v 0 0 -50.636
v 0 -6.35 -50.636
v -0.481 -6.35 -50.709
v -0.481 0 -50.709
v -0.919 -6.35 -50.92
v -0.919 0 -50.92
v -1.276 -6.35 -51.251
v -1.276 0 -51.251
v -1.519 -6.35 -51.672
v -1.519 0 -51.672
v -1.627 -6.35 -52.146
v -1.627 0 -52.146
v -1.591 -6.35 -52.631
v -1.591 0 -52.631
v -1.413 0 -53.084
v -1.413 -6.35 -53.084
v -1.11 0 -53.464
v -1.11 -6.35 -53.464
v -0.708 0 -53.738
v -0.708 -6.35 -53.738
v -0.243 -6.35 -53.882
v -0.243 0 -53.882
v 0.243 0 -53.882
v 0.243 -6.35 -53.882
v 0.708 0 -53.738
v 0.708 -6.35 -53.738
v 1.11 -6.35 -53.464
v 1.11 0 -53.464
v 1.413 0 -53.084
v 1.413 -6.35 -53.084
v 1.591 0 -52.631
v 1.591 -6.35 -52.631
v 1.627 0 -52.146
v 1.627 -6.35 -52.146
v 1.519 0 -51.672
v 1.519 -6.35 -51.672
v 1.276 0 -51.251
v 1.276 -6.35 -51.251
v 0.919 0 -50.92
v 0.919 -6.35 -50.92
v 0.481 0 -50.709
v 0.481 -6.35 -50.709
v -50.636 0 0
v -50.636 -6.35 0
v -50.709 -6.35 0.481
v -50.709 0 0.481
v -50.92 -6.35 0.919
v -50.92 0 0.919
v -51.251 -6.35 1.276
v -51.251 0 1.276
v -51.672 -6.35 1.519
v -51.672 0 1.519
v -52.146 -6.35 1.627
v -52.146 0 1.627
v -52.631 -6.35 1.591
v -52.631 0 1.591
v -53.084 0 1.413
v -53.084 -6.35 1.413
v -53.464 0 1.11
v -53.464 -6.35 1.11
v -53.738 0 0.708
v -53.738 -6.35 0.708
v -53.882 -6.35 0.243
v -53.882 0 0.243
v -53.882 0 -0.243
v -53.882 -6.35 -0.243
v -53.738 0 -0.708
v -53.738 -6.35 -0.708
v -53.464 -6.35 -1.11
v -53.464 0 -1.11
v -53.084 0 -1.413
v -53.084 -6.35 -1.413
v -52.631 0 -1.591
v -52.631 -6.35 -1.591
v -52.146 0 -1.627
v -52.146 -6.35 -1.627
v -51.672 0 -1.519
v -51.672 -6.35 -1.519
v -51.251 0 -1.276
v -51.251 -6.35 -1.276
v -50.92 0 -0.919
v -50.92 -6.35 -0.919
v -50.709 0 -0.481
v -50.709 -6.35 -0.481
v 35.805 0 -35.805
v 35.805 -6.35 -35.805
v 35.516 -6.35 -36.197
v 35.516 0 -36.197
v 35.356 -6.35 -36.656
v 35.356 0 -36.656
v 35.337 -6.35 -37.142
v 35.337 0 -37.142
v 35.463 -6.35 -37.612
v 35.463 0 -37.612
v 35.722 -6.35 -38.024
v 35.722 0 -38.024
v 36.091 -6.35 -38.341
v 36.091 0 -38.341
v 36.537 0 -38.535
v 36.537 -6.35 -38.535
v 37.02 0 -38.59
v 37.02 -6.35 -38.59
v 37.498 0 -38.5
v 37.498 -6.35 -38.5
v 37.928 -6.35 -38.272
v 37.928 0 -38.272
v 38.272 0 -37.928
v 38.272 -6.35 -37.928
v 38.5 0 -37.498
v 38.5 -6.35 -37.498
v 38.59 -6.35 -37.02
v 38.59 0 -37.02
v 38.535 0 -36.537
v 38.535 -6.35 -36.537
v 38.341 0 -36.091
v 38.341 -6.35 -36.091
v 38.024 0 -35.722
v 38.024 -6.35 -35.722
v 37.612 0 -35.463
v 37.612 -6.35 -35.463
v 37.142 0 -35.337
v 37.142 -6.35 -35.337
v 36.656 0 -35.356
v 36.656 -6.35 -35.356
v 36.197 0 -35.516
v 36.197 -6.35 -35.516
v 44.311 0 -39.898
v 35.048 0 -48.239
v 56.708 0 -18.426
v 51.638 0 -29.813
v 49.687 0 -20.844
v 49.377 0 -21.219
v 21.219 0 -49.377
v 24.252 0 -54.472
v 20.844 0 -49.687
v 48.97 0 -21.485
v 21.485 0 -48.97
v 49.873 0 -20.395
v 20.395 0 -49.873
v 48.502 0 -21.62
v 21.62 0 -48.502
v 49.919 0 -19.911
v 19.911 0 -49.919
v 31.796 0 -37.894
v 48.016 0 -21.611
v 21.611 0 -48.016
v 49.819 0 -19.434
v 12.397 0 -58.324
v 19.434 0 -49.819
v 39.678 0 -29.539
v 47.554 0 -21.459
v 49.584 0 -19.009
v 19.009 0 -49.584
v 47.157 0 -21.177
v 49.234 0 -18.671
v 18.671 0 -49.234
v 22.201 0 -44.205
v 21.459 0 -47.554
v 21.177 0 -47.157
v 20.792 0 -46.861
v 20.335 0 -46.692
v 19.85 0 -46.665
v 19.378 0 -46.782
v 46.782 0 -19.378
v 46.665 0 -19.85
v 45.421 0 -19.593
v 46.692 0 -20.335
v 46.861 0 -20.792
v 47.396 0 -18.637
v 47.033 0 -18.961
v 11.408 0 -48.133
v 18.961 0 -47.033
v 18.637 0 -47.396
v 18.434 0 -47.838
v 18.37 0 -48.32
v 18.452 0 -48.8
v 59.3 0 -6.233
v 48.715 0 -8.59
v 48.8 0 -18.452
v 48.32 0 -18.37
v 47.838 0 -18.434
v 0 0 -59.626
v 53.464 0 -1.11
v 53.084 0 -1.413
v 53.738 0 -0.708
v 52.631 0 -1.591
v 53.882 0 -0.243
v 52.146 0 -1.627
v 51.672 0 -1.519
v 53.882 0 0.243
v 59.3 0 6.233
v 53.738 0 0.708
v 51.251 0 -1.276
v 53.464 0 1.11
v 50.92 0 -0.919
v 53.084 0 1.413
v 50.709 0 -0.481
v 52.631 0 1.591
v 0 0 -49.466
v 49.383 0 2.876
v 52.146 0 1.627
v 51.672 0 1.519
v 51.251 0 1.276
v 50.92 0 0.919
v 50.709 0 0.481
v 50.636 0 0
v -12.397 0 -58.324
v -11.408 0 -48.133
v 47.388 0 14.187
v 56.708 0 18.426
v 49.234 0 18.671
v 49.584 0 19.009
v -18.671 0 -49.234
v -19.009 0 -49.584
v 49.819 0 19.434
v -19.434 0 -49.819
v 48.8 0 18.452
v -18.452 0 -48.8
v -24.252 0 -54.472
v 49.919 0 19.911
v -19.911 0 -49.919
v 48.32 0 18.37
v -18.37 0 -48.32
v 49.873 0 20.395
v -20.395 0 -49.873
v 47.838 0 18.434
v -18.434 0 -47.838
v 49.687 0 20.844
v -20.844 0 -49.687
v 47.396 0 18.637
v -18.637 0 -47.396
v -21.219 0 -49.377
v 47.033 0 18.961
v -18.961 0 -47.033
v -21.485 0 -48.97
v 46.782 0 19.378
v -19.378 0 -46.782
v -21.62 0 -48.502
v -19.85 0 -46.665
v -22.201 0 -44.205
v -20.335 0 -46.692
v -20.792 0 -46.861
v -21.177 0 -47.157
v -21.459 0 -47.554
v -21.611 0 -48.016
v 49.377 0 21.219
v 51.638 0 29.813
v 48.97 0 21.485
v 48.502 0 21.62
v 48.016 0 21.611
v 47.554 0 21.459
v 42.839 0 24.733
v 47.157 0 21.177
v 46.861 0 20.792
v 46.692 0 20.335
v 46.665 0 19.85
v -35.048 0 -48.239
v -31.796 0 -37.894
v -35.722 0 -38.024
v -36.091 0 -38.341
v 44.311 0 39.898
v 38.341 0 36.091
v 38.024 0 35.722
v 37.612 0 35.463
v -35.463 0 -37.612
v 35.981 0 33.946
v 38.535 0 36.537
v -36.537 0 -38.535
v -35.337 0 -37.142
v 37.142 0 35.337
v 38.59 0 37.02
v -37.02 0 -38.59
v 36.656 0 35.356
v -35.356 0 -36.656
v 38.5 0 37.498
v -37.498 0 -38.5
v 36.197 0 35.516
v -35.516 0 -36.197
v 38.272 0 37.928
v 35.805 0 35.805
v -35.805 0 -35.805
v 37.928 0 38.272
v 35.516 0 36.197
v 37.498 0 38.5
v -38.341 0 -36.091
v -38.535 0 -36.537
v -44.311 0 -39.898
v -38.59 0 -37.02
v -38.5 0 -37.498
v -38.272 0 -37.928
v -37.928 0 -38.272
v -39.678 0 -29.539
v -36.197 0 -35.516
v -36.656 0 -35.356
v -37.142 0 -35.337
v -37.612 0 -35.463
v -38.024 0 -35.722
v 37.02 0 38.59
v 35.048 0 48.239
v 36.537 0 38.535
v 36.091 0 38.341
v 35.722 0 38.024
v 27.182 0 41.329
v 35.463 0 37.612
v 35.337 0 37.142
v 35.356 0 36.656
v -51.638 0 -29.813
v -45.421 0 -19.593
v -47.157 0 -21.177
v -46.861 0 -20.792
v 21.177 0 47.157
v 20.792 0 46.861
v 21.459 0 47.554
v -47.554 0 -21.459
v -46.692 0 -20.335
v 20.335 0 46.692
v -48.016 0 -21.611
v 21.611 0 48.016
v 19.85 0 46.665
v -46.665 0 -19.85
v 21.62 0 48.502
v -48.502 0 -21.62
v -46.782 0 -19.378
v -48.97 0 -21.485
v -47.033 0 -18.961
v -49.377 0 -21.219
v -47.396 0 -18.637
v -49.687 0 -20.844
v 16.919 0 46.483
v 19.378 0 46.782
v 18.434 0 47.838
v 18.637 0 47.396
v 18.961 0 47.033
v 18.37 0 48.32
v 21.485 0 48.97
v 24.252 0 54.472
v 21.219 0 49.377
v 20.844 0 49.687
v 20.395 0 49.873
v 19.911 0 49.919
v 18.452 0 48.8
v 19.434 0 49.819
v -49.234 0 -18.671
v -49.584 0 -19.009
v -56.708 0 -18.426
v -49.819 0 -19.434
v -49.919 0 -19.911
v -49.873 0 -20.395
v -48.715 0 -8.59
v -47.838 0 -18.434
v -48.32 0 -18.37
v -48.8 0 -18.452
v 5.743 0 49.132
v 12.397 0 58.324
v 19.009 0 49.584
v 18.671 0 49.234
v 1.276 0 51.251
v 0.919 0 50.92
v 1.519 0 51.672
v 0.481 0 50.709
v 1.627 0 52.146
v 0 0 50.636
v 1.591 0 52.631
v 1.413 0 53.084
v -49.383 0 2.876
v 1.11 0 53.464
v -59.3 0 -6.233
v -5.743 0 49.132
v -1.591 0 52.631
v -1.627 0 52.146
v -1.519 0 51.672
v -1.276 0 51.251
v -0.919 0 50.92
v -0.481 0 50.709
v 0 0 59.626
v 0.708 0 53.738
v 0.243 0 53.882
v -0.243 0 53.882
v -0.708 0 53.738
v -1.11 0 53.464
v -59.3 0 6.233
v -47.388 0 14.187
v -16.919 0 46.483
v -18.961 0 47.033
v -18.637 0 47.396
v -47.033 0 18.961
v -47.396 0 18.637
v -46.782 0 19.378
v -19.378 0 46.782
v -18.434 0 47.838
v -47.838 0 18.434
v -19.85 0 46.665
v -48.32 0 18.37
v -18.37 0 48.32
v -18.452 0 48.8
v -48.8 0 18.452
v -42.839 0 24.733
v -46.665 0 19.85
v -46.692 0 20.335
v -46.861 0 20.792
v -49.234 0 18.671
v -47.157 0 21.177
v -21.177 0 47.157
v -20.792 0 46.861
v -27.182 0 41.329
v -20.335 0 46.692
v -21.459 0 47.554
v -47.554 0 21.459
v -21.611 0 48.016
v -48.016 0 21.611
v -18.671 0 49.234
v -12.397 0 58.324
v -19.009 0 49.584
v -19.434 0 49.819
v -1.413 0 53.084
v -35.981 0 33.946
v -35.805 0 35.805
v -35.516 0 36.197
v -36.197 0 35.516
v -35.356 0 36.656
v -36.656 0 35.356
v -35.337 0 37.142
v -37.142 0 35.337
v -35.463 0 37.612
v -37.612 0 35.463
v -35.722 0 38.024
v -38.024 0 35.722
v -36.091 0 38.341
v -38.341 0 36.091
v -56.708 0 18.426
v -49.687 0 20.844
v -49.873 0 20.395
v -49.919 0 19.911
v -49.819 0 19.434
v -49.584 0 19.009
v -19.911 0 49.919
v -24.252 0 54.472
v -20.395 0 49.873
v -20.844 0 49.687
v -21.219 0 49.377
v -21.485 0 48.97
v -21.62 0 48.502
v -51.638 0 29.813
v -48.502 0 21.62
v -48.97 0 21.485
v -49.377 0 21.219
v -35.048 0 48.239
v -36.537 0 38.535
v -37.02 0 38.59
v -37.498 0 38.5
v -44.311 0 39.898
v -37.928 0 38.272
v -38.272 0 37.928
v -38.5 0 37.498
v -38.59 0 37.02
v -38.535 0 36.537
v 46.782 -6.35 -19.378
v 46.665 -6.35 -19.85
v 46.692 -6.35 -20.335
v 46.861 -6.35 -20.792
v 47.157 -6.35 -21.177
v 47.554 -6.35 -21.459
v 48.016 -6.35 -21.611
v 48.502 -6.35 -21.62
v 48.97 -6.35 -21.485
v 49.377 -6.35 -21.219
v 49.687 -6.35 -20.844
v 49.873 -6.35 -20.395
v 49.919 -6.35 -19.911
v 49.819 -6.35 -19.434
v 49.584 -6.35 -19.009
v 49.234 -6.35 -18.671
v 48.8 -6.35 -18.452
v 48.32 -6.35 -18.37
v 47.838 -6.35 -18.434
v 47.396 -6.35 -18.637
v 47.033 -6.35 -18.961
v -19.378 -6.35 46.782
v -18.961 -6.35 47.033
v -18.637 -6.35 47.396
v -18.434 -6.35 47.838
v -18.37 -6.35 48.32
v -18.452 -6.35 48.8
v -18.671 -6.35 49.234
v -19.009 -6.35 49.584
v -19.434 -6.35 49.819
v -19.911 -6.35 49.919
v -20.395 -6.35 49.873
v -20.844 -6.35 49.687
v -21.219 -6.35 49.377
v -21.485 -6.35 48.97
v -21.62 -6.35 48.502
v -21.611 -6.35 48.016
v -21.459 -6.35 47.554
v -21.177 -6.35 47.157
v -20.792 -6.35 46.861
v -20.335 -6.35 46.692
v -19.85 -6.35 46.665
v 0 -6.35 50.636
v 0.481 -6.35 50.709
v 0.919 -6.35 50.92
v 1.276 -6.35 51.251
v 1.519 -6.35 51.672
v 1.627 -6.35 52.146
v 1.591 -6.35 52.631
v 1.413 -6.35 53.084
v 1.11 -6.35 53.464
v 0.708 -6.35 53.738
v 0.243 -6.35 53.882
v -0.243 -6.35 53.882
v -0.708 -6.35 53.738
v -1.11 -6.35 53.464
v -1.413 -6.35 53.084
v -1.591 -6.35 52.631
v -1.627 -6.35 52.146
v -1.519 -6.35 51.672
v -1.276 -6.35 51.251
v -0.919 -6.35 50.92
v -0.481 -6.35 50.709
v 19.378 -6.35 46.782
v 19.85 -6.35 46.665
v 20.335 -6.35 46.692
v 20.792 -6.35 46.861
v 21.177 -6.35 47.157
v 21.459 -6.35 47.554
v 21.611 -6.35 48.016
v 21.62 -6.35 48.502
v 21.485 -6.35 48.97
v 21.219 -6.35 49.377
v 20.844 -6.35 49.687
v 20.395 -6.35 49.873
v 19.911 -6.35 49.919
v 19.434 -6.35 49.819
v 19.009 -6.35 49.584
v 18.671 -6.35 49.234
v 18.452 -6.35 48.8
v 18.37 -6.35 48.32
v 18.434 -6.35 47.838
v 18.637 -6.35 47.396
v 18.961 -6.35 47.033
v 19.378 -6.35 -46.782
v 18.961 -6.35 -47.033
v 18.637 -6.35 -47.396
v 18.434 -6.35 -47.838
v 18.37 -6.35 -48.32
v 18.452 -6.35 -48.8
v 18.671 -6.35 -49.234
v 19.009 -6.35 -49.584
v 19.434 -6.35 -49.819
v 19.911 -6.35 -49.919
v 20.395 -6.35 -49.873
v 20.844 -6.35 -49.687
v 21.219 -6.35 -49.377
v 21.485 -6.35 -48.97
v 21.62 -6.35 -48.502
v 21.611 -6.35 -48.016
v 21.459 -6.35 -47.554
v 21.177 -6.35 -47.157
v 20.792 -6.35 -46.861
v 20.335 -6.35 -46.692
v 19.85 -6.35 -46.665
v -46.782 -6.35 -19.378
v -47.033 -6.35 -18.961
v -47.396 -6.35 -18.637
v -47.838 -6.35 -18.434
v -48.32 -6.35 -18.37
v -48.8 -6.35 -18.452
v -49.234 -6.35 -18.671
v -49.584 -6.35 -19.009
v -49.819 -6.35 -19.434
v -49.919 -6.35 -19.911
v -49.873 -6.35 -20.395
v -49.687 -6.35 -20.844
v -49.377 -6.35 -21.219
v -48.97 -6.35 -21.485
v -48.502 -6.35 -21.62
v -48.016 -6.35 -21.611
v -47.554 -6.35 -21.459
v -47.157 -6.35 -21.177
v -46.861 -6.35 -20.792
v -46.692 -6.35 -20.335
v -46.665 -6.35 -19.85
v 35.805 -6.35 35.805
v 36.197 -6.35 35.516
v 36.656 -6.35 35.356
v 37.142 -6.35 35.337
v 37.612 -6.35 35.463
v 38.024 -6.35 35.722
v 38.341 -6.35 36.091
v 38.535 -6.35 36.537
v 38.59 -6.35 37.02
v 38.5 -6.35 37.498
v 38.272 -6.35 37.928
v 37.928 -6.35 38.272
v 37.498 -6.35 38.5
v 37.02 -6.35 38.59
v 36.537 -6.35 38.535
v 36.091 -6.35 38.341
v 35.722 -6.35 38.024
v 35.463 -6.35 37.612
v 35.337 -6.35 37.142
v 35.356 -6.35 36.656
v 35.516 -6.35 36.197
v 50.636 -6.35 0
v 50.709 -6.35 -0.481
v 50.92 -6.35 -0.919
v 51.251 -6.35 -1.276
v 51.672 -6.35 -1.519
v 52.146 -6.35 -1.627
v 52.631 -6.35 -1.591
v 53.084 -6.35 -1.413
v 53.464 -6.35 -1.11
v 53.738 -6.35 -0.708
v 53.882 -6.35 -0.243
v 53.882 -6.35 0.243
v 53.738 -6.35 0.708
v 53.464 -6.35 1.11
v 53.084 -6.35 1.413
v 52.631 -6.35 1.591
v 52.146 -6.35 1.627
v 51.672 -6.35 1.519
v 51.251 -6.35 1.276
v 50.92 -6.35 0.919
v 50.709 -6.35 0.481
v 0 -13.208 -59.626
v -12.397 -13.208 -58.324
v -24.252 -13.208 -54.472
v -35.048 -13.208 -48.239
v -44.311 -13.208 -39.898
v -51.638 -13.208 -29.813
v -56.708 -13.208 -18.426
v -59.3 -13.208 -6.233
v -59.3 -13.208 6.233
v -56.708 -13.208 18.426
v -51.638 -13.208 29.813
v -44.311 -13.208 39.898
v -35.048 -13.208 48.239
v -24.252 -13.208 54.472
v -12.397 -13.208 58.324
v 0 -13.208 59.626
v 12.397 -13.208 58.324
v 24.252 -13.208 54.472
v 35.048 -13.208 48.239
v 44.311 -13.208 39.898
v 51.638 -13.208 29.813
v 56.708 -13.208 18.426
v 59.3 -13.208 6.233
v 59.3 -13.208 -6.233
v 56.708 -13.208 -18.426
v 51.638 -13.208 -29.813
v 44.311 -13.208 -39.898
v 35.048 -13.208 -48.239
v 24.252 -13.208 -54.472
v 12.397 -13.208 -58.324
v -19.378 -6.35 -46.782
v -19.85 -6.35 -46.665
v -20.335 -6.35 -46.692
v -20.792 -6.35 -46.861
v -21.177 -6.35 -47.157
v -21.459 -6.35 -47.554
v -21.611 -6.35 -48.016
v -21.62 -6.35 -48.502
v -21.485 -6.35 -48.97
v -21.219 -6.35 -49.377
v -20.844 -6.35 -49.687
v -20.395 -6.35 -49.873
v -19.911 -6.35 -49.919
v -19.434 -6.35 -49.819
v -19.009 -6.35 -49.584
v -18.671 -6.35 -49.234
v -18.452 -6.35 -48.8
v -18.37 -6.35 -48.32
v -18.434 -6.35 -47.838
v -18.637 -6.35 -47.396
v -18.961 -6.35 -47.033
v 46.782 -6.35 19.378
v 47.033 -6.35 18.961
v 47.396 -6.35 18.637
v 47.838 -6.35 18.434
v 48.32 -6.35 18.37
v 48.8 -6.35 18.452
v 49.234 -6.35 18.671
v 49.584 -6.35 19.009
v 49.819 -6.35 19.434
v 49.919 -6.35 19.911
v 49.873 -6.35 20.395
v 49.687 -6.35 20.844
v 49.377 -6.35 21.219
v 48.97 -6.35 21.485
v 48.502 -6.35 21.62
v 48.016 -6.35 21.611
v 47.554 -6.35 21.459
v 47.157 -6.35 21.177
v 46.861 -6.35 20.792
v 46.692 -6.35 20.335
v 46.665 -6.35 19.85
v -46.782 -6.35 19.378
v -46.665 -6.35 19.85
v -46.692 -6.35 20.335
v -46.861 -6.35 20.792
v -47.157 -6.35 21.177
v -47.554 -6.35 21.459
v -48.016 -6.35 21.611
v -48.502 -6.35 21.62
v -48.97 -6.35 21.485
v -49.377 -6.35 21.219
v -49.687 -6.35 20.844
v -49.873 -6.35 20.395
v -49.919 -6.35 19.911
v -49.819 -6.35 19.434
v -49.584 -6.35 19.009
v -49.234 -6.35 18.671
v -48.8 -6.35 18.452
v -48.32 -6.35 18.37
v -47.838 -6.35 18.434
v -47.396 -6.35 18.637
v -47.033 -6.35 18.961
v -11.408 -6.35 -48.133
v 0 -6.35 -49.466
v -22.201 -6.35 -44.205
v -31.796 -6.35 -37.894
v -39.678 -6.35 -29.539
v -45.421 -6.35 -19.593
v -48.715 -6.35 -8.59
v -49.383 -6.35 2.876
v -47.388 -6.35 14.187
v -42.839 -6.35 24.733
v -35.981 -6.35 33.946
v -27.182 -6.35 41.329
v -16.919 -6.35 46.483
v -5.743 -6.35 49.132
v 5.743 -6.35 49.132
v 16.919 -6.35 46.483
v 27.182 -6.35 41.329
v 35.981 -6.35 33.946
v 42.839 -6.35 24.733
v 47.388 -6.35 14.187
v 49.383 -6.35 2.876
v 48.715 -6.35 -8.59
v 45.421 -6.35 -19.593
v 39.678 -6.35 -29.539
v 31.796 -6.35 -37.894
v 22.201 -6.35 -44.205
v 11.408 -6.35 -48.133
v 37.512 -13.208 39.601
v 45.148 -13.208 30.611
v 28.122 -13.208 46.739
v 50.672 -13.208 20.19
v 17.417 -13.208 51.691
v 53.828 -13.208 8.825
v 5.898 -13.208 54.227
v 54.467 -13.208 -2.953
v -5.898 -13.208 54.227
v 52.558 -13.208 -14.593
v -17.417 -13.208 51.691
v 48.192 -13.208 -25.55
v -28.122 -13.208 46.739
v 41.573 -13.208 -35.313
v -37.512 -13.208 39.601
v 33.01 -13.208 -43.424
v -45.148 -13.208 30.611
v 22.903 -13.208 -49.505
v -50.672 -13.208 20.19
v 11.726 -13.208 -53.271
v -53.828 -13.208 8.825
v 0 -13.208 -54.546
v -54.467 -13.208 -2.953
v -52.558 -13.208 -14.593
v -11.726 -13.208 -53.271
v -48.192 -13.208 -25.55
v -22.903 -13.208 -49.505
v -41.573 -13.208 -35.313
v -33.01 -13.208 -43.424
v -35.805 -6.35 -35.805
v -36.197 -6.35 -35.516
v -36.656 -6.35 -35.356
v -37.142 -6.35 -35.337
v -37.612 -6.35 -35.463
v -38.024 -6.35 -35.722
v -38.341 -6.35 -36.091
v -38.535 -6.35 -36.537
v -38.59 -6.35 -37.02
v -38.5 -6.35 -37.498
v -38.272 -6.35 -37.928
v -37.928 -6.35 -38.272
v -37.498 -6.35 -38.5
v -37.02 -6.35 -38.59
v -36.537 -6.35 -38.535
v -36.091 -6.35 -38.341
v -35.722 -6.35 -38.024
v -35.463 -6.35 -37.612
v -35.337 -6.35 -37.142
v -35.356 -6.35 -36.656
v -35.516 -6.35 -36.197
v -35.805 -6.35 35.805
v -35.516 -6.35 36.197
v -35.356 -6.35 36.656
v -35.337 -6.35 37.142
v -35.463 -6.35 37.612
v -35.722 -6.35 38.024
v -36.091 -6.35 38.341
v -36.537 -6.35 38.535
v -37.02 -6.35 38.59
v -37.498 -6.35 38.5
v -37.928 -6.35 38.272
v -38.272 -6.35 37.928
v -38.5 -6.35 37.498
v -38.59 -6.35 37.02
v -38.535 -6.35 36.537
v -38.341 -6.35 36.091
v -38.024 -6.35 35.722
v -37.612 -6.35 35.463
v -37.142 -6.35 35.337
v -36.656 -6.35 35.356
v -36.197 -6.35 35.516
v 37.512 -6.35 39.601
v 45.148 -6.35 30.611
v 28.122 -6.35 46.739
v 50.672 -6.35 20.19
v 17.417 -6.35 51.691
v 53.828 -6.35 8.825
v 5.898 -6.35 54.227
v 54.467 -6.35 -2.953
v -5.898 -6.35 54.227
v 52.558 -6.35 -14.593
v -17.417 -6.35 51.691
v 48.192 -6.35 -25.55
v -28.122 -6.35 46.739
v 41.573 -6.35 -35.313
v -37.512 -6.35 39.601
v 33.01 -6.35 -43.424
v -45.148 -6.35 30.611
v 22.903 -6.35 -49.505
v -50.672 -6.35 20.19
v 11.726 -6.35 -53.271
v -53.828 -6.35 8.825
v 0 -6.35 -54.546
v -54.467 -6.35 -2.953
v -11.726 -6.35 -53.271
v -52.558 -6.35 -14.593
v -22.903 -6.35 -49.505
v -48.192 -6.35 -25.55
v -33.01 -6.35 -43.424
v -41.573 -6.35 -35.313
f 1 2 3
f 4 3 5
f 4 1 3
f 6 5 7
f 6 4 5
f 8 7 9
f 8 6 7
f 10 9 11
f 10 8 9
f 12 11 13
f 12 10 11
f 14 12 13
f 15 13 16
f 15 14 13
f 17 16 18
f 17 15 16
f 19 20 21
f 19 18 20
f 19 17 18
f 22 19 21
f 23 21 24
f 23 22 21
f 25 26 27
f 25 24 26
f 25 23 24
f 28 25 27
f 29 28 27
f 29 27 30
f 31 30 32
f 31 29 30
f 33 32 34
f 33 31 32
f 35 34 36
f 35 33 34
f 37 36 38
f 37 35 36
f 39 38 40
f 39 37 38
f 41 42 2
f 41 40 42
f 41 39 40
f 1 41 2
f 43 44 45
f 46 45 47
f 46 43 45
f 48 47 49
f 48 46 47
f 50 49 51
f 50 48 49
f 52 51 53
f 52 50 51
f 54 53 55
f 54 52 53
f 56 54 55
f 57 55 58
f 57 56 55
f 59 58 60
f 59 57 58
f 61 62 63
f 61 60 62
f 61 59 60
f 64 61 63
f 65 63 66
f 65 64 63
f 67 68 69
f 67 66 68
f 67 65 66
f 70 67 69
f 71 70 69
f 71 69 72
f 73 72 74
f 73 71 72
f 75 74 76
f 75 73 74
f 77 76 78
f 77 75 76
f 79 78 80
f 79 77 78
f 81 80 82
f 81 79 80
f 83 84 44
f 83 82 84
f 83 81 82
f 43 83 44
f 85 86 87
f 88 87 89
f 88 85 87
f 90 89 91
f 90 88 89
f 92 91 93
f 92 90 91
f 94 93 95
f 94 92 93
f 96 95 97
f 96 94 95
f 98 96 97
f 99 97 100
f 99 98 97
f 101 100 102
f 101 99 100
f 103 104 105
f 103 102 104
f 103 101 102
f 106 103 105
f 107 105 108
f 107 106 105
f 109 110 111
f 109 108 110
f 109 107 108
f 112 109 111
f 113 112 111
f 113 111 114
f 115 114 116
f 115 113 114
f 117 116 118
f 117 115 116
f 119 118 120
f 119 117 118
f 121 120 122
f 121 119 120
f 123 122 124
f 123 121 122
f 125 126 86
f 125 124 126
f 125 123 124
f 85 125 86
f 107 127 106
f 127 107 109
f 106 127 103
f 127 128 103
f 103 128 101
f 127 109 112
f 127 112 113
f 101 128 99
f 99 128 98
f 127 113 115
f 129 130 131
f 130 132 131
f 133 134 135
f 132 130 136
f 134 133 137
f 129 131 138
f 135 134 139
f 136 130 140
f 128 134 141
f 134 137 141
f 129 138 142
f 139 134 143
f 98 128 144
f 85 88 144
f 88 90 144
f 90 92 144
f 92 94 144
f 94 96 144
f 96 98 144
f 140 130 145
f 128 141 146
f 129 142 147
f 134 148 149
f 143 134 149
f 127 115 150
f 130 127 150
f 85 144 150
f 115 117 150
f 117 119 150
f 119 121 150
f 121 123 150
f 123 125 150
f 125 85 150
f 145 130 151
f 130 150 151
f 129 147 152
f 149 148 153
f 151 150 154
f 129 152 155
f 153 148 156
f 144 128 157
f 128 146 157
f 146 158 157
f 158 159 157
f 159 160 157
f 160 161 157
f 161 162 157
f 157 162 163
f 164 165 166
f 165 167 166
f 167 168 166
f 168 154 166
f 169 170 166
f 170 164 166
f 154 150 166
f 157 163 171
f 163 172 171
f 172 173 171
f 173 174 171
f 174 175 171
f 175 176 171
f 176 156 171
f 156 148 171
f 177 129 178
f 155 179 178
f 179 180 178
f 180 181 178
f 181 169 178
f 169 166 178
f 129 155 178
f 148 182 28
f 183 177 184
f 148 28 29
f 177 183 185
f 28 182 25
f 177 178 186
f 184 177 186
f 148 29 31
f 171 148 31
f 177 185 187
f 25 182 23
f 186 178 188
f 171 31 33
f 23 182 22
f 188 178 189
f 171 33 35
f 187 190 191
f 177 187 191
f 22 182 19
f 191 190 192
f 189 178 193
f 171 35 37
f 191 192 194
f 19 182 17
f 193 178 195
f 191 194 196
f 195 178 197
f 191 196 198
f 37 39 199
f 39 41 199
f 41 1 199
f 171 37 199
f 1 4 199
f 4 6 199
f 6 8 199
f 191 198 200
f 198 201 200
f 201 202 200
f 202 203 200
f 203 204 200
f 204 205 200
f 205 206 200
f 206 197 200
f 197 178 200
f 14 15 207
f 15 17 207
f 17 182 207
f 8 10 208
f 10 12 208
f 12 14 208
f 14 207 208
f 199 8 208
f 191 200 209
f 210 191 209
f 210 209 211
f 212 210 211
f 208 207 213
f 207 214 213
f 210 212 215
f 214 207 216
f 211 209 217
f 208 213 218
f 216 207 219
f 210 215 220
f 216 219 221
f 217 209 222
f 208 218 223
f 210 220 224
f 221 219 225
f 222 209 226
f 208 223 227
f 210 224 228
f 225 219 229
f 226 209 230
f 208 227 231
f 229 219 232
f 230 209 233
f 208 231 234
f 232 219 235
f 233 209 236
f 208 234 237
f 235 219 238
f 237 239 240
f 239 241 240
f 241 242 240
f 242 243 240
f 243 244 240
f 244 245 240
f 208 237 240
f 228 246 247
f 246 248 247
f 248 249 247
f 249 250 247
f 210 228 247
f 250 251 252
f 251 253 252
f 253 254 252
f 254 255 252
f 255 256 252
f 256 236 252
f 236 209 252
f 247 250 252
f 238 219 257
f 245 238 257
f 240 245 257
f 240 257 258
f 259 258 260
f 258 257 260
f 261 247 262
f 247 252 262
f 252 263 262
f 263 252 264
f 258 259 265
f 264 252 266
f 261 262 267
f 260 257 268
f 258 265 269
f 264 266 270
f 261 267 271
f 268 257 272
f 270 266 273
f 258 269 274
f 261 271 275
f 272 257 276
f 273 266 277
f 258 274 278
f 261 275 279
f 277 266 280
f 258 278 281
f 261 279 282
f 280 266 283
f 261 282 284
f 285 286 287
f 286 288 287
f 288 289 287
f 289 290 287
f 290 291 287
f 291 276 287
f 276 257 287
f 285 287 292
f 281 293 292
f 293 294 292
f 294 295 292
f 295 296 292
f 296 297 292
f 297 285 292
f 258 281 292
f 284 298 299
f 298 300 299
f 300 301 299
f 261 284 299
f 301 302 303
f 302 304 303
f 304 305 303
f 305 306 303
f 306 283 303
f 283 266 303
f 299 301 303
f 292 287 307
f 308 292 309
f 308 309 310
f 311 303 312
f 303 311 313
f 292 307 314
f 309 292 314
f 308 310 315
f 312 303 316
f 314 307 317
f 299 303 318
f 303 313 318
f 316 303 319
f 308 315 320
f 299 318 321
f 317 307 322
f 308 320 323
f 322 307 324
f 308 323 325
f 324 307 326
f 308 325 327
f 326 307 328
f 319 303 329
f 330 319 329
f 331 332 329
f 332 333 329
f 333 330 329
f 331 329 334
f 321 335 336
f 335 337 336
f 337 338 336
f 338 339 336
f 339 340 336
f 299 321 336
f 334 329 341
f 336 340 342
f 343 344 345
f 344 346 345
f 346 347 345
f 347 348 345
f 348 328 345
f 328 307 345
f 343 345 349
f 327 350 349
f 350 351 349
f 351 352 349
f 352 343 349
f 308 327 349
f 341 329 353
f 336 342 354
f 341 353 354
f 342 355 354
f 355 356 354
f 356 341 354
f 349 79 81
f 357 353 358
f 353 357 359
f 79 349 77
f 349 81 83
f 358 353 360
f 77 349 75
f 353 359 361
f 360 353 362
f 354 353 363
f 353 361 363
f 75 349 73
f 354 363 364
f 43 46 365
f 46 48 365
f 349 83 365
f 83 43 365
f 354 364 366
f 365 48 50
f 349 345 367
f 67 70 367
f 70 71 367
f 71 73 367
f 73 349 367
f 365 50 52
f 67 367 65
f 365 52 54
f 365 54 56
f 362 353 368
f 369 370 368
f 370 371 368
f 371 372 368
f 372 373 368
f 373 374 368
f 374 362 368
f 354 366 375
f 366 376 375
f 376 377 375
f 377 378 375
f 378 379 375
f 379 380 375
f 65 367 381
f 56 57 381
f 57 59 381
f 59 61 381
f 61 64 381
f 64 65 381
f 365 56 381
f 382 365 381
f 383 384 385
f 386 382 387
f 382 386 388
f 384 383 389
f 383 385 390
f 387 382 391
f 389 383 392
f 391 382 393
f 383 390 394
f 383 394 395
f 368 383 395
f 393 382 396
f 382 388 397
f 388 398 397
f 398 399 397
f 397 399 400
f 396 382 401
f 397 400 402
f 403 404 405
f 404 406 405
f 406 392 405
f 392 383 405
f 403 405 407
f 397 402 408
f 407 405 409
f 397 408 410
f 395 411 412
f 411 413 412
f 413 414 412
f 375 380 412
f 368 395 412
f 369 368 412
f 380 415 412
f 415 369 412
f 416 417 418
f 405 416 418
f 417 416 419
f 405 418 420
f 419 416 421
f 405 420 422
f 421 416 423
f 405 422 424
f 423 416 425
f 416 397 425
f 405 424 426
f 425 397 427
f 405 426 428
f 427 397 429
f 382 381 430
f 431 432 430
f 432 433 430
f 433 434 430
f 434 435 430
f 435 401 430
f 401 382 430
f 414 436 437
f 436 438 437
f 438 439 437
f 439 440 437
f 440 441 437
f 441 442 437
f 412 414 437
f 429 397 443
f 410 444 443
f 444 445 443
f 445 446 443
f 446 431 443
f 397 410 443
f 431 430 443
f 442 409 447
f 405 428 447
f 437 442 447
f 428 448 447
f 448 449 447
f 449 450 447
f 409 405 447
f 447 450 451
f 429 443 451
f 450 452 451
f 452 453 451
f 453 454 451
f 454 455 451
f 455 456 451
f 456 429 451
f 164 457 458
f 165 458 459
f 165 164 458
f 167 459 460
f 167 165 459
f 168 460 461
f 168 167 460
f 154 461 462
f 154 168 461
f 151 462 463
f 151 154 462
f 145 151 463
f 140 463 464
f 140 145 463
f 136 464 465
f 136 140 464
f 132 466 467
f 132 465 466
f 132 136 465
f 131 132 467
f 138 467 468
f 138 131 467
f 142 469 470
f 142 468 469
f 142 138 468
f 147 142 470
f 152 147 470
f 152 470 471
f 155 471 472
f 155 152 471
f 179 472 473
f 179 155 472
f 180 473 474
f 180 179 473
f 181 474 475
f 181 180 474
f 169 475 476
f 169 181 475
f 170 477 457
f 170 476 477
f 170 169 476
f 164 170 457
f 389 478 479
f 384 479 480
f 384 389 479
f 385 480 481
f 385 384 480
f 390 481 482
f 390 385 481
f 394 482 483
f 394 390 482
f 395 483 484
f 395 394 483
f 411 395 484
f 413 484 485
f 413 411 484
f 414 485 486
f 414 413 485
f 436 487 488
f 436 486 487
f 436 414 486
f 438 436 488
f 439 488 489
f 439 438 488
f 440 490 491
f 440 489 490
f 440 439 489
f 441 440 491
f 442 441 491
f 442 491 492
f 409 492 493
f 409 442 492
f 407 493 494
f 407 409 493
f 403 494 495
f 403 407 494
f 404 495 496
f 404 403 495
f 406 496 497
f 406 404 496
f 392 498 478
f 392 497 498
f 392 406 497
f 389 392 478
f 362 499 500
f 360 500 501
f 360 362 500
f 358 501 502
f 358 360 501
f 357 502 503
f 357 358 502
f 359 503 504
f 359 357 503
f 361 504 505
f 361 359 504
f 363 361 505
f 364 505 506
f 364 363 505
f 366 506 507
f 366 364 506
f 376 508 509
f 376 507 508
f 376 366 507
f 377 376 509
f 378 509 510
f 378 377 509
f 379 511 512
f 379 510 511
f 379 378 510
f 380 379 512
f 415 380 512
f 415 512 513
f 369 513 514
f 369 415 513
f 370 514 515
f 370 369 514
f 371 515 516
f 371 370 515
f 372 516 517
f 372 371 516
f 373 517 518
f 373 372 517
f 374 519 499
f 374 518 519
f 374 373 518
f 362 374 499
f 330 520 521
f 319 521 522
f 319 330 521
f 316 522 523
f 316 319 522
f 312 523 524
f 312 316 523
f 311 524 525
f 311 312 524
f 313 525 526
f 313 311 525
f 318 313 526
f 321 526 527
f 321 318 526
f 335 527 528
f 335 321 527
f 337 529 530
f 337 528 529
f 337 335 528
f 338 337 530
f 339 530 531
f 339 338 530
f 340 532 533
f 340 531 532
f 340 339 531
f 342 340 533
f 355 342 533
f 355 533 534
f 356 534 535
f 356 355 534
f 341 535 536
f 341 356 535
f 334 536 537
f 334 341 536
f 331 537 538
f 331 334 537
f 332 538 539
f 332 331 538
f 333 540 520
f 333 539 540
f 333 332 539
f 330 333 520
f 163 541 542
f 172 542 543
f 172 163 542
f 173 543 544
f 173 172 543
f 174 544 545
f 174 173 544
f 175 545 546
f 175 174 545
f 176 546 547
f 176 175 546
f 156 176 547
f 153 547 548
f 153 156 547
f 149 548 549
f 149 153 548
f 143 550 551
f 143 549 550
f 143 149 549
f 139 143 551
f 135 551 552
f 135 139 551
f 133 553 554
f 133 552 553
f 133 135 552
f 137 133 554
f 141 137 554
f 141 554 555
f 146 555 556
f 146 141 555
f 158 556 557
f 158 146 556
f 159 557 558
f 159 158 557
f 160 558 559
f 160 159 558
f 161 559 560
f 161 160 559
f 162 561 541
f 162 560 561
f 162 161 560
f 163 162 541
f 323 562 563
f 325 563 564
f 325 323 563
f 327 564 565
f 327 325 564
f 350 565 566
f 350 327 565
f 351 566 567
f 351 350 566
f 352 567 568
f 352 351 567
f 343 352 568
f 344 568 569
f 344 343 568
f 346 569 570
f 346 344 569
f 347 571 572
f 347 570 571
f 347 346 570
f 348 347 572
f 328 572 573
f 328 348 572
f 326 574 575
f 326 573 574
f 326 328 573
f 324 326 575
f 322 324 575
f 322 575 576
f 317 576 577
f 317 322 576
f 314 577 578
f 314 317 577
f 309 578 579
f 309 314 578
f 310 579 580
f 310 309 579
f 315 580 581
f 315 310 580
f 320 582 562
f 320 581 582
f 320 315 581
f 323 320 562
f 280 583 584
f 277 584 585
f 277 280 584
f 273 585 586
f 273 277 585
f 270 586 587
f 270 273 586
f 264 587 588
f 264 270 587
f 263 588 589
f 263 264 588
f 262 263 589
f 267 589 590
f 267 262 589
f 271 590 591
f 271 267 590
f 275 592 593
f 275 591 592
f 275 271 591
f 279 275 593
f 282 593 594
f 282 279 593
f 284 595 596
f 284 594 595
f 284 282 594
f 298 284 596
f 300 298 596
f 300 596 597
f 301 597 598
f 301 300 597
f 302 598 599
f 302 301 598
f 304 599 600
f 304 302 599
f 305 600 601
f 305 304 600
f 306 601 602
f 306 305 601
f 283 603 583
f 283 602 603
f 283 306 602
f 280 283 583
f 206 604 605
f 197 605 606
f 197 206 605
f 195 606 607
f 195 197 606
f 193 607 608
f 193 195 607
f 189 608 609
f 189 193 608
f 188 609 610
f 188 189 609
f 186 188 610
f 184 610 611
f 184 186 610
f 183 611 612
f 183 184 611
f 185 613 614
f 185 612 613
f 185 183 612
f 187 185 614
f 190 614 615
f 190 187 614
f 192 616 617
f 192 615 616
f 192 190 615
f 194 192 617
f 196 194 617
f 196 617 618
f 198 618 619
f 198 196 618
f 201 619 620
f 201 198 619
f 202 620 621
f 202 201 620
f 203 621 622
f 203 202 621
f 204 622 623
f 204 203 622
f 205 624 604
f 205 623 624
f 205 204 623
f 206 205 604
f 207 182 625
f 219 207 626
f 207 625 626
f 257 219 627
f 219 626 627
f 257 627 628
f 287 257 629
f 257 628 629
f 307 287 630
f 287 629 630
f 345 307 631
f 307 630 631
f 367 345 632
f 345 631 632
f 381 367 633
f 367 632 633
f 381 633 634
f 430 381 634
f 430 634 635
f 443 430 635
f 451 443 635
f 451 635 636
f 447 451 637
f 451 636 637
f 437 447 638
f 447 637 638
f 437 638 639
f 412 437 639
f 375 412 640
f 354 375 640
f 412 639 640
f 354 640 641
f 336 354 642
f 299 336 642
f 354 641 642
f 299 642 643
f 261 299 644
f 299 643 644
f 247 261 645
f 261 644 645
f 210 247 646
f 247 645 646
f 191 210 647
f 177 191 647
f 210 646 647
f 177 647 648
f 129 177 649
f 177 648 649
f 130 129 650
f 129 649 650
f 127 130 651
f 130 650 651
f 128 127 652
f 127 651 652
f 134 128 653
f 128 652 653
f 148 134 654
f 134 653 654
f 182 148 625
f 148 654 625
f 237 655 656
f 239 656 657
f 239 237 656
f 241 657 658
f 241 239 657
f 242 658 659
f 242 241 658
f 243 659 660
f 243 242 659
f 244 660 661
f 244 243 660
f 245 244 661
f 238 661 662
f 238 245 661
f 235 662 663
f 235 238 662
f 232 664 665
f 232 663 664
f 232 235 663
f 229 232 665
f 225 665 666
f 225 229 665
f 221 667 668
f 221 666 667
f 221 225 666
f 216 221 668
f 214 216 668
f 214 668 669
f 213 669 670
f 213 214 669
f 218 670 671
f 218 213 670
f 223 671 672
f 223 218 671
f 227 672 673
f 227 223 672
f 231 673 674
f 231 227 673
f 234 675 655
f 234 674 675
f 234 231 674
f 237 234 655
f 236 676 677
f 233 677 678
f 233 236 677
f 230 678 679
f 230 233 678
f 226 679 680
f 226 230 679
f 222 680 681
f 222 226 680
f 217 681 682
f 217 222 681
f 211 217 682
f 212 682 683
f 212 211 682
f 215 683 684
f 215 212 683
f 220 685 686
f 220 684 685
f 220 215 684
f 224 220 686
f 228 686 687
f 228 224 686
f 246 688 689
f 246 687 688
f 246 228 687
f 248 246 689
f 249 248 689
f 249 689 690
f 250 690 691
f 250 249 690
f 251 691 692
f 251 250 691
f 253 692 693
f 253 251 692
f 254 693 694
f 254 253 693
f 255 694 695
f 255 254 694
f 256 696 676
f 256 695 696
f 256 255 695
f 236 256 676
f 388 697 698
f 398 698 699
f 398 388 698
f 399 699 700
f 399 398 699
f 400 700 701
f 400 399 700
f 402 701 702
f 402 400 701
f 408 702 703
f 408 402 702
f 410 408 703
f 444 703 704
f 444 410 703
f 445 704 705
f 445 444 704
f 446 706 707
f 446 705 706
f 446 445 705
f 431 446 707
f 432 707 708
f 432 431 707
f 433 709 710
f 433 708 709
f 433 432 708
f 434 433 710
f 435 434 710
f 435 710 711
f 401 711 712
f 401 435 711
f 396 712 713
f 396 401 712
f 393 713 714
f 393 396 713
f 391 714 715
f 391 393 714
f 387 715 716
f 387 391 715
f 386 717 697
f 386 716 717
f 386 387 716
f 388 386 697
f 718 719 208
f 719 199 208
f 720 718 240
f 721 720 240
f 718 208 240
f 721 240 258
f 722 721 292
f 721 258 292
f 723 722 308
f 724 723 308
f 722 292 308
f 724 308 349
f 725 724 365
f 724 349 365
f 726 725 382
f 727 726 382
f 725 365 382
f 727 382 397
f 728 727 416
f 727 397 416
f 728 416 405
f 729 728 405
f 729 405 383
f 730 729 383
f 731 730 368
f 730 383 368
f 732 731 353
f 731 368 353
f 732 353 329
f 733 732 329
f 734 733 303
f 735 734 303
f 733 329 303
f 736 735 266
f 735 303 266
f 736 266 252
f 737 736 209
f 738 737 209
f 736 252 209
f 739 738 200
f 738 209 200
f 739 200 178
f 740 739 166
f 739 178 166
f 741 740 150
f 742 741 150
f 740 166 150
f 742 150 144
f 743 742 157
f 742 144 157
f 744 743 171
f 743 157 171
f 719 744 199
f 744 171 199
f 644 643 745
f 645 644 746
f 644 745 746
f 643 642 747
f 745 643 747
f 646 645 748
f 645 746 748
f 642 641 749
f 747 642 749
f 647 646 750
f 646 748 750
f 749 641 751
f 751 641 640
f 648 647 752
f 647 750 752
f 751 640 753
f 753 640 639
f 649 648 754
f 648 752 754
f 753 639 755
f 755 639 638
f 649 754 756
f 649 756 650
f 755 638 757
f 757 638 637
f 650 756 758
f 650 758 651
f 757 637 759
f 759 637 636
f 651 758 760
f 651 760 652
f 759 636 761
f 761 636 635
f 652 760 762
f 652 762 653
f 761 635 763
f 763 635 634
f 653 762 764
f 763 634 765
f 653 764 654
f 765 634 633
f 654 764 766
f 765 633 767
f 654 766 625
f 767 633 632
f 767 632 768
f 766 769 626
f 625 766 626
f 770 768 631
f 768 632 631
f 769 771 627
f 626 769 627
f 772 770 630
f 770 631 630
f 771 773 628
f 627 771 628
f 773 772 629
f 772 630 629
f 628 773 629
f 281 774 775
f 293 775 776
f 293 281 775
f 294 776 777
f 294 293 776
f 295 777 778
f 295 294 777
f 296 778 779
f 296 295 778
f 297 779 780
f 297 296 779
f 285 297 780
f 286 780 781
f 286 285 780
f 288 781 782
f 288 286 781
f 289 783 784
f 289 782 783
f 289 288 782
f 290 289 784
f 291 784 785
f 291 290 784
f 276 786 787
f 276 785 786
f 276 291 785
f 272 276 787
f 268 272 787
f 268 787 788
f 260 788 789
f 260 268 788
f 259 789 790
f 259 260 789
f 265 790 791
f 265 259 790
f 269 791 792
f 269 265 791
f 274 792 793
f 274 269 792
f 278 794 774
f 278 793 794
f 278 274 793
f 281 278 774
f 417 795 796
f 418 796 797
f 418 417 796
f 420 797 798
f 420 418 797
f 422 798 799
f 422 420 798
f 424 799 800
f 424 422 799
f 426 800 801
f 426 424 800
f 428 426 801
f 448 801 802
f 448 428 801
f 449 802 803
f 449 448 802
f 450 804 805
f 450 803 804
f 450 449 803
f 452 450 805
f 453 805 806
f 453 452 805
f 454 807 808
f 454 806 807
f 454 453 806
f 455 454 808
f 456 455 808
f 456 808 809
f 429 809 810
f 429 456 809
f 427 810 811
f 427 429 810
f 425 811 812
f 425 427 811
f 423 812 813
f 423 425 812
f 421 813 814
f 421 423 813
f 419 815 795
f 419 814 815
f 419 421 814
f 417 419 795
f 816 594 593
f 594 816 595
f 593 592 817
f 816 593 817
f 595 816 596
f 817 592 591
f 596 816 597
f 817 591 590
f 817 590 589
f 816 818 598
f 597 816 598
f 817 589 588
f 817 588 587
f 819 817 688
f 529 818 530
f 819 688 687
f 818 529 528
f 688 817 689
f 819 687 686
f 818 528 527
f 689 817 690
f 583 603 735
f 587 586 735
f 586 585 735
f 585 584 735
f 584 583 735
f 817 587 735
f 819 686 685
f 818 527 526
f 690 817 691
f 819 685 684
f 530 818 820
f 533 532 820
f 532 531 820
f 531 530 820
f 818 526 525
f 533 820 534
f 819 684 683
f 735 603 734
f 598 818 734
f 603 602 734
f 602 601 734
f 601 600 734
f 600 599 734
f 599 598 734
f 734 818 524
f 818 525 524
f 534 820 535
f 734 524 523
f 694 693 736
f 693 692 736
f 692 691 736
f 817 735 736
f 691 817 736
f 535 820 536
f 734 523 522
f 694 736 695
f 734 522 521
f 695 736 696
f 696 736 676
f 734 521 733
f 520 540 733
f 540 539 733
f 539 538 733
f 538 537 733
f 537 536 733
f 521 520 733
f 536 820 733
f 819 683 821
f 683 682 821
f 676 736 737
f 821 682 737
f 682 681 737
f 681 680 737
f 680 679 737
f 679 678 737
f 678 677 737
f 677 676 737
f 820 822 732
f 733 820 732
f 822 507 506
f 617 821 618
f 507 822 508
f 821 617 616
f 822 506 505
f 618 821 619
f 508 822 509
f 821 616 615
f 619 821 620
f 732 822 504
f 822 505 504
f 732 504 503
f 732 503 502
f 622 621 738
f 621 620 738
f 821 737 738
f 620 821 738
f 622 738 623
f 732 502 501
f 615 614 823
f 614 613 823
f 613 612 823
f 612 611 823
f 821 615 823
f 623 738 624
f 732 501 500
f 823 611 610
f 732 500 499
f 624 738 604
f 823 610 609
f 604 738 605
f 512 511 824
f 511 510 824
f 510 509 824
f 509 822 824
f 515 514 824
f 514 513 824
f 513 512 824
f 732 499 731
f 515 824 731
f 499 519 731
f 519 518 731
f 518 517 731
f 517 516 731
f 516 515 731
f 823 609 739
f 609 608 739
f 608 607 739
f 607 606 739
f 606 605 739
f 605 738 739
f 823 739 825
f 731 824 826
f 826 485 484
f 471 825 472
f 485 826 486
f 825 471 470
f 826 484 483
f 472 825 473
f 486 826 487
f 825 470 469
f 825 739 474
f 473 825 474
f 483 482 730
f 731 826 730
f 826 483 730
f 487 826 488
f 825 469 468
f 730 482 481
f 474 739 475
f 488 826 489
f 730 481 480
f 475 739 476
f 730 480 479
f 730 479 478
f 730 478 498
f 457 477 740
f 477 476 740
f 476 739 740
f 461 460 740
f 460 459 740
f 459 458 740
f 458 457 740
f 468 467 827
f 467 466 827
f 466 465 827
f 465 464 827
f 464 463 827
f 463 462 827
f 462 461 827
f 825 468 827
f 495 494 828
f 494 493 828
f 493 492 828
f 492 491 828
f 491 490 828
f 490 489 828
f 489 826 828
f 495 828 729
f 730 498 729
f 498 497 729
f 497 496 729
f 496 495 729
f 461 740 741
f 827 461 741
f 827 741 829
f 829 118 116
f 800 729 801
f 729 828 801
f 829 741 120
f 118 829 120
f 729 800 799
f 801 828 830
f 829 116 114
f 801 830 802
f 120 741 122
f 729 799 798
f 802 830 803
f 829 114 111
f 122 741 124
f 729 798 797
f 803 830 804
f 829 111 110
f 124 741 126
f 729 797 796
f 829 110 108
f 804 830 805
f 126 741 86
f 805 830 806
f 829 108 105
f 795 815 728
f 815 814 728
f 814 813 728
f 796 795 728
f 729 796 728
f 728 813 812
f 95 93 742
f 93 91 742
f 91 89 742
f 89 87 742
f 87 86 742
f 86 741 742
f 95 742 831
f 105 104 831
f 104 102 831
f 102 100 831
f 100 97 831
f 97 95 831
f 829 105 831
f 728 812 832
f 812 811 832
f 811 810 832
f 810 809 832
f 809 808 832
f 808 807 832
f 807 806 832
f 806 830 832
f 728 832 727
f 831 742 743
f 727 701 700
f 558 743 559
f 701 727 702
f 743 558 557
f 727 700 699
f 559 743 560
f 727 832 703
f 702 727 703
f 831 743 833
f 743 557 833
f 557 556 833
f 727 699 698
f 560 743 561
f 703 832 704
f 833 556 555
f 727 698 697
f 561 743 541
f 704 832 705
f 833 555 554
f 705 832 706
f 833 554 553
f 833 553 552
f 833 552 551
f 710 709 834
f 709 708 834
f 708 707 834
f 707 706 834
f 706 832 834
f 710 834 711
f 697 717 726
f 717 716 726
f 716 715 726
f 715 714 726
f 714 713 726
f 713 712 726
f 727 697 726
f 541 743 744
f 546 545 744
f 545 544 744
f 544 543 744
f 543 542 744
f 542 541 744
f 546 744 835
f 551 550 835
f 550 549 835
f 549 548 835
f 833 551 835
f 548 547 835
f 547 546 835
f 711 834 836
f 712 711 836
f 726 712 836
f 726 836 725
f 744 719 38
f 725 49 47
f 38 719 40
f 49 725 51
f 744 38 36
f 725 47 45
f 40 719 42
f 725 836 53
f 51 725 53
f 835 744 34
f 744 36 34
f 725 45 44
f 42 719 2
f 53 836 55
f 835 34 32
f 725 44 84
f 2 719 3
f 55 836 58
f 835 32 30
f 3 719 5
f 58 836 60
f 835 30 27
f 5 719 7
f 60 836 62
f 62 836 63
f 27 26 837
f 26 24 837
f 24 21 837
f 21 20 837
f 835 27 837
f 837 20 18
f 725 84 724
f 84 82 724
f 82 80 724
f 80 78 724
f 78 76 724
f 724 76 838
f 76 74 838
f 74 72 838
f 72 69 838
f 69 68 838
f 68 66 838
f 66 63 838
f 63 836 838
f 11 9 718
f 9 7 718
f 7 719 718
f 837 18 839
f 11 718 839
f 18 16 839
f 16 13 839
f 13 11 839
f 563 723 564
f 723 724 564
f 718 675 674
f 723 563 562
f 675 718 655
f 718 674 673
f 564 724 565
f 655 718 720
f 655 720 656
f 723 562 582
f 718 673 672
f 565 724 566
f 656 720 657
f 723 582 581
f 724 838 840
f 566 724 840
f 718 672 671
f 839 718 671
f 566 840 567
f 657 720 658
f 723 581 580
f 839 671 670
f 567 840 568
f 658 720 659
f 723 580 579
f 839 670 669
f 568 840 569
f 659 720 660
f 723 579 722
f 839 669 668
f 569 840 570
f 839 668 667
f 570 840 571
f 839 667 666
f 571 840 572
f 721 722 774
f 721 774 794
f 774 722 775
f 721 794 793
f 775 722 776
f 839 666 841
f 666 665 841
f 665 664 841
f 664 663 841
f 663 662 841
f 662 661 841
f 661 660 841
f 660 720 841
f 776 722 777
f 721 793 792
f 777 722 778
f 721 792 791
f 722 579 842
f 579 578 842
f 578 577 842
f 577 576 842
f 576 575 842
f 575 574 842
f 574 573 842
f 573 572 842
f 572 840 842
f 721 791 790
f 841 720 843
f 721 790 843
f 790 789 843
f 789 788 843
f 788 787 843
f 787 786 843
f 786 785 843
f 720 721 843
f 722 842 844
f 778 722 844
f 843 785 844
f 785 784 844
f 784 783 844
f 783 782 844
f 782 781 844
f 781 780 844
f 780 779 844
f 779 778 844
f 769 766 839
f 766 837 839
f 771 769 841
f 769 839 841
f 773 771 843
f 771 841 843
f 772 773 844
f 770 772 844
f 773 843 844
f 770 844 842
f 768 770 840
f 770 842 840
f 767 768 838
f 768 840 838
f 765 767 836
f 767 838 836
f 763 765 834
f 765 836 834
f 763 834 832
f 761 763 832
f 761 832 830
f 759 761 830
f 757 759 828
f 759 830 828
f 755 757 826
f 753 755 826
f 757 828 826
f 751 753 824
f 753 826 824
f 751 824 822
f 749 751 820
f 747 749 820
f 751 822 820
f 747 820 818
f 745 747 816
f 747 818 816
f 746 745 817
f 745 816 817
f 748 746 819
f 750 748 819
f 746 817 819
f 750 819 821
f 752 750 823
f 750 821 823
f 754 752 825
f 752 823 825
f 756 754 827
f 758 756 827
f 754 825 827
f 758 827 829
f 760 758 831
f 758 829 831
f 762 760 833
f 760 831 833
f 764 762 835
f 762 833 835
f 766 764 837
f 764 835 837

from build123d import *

# Parameters (mm, degrees)
CIRPATTERN1_COUNT = 16


with BuildPart() as part:
    # Sketch1 → Revolve1 (revolve)
    with BuildSketch(Plane.XY, mode=Mode.PRIVATE) as revolve1_sk:
        Polygon((-49.4665, 0), (-59.6265, 0), (-59.6265, -13.208), (-54.5465, -13.208), (-54.5465, -6.35), (-49.4665, -6.35), align=None)
    revolve(revolve1_sk.sketch.rotate(Axis((0, 0, 0), (0, 1, 0)), 270), axis=Axis((0, 0, 0), (0, 1, 0)))

    # Sketch3 → #4 Clearance Hole1 (revolve, cut)
    with BuildSketch(Plane(origin=(0, 0, -52.26812), x_dir=(0, 0, 1), z_dir=(1, 0, 0))):
        Polygon((0, 0), (0, 11.140574487), (1.63195, 10.16), (1.63195, 0), align=None)
    f_4_clearance_hole1 = revolve(axis=Axis((0, 6.35, -52.26812), (0, -1, 0)), mode=Mode.SUBTRACT)

    # CirPattern1: #4 Clearance Hole1 ×16 about axis
    cirpattern1_axis = Axis((0, 0, 0), (0, 1, 0))
    for i in range(1, CIRPATTERN1_COUNT):
        add(f_4_clearance_hole1.rotate(cirpattern1_axis, i * 360 / CIRPATTERN1_COUNT), mode=Mode.SUBTRACT)


solid = part.part
